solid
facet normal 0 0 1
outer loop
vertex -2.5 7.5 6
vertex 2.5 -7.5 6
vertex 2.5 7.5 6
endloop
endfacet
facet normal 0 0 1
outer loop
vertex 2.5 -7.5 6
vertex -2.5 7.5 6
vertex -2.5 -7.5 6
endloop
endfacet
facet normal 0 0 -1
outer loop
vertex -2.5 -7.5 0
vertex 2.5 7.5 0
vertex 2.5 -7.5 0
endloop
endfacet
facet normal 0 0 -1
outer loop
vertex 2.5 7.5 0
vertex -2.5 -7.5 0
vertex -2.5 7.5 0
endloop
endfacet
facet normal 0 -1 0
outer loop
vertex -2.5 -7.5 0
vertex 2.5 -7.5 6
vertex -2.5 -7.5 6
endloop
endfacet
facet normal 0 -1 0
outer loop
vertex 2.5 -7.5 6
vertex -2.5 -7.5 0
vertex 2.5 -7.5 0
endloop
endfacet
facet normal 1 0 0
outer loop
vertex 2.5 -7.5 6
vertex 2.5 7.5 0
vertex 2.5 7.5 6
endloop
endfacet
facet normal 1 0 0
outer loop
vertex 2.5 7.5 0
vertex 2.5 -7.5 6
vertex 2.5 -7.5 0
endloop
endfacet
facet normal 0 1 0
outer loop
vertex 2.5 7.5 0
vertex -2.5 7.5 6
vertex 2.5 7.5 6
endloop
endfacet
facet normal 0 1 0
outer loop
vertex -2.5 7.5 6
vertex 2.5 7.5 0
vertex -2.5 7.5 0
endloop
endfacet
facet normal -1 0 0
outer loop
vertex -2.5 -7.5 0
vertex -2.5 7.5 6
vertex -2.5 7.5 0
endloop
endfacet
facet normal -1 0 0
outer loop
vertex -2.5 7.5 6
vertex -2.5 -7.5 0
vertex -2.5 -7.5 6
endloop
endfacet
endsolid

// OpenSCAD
// brick 1x3

// external vars

ext_scale = 1.0;

// part

scale([ext_scale,ext_scale,ext_scale])
translate([-2.5,-7.5,0])
cube([5,15,6],center=false);
